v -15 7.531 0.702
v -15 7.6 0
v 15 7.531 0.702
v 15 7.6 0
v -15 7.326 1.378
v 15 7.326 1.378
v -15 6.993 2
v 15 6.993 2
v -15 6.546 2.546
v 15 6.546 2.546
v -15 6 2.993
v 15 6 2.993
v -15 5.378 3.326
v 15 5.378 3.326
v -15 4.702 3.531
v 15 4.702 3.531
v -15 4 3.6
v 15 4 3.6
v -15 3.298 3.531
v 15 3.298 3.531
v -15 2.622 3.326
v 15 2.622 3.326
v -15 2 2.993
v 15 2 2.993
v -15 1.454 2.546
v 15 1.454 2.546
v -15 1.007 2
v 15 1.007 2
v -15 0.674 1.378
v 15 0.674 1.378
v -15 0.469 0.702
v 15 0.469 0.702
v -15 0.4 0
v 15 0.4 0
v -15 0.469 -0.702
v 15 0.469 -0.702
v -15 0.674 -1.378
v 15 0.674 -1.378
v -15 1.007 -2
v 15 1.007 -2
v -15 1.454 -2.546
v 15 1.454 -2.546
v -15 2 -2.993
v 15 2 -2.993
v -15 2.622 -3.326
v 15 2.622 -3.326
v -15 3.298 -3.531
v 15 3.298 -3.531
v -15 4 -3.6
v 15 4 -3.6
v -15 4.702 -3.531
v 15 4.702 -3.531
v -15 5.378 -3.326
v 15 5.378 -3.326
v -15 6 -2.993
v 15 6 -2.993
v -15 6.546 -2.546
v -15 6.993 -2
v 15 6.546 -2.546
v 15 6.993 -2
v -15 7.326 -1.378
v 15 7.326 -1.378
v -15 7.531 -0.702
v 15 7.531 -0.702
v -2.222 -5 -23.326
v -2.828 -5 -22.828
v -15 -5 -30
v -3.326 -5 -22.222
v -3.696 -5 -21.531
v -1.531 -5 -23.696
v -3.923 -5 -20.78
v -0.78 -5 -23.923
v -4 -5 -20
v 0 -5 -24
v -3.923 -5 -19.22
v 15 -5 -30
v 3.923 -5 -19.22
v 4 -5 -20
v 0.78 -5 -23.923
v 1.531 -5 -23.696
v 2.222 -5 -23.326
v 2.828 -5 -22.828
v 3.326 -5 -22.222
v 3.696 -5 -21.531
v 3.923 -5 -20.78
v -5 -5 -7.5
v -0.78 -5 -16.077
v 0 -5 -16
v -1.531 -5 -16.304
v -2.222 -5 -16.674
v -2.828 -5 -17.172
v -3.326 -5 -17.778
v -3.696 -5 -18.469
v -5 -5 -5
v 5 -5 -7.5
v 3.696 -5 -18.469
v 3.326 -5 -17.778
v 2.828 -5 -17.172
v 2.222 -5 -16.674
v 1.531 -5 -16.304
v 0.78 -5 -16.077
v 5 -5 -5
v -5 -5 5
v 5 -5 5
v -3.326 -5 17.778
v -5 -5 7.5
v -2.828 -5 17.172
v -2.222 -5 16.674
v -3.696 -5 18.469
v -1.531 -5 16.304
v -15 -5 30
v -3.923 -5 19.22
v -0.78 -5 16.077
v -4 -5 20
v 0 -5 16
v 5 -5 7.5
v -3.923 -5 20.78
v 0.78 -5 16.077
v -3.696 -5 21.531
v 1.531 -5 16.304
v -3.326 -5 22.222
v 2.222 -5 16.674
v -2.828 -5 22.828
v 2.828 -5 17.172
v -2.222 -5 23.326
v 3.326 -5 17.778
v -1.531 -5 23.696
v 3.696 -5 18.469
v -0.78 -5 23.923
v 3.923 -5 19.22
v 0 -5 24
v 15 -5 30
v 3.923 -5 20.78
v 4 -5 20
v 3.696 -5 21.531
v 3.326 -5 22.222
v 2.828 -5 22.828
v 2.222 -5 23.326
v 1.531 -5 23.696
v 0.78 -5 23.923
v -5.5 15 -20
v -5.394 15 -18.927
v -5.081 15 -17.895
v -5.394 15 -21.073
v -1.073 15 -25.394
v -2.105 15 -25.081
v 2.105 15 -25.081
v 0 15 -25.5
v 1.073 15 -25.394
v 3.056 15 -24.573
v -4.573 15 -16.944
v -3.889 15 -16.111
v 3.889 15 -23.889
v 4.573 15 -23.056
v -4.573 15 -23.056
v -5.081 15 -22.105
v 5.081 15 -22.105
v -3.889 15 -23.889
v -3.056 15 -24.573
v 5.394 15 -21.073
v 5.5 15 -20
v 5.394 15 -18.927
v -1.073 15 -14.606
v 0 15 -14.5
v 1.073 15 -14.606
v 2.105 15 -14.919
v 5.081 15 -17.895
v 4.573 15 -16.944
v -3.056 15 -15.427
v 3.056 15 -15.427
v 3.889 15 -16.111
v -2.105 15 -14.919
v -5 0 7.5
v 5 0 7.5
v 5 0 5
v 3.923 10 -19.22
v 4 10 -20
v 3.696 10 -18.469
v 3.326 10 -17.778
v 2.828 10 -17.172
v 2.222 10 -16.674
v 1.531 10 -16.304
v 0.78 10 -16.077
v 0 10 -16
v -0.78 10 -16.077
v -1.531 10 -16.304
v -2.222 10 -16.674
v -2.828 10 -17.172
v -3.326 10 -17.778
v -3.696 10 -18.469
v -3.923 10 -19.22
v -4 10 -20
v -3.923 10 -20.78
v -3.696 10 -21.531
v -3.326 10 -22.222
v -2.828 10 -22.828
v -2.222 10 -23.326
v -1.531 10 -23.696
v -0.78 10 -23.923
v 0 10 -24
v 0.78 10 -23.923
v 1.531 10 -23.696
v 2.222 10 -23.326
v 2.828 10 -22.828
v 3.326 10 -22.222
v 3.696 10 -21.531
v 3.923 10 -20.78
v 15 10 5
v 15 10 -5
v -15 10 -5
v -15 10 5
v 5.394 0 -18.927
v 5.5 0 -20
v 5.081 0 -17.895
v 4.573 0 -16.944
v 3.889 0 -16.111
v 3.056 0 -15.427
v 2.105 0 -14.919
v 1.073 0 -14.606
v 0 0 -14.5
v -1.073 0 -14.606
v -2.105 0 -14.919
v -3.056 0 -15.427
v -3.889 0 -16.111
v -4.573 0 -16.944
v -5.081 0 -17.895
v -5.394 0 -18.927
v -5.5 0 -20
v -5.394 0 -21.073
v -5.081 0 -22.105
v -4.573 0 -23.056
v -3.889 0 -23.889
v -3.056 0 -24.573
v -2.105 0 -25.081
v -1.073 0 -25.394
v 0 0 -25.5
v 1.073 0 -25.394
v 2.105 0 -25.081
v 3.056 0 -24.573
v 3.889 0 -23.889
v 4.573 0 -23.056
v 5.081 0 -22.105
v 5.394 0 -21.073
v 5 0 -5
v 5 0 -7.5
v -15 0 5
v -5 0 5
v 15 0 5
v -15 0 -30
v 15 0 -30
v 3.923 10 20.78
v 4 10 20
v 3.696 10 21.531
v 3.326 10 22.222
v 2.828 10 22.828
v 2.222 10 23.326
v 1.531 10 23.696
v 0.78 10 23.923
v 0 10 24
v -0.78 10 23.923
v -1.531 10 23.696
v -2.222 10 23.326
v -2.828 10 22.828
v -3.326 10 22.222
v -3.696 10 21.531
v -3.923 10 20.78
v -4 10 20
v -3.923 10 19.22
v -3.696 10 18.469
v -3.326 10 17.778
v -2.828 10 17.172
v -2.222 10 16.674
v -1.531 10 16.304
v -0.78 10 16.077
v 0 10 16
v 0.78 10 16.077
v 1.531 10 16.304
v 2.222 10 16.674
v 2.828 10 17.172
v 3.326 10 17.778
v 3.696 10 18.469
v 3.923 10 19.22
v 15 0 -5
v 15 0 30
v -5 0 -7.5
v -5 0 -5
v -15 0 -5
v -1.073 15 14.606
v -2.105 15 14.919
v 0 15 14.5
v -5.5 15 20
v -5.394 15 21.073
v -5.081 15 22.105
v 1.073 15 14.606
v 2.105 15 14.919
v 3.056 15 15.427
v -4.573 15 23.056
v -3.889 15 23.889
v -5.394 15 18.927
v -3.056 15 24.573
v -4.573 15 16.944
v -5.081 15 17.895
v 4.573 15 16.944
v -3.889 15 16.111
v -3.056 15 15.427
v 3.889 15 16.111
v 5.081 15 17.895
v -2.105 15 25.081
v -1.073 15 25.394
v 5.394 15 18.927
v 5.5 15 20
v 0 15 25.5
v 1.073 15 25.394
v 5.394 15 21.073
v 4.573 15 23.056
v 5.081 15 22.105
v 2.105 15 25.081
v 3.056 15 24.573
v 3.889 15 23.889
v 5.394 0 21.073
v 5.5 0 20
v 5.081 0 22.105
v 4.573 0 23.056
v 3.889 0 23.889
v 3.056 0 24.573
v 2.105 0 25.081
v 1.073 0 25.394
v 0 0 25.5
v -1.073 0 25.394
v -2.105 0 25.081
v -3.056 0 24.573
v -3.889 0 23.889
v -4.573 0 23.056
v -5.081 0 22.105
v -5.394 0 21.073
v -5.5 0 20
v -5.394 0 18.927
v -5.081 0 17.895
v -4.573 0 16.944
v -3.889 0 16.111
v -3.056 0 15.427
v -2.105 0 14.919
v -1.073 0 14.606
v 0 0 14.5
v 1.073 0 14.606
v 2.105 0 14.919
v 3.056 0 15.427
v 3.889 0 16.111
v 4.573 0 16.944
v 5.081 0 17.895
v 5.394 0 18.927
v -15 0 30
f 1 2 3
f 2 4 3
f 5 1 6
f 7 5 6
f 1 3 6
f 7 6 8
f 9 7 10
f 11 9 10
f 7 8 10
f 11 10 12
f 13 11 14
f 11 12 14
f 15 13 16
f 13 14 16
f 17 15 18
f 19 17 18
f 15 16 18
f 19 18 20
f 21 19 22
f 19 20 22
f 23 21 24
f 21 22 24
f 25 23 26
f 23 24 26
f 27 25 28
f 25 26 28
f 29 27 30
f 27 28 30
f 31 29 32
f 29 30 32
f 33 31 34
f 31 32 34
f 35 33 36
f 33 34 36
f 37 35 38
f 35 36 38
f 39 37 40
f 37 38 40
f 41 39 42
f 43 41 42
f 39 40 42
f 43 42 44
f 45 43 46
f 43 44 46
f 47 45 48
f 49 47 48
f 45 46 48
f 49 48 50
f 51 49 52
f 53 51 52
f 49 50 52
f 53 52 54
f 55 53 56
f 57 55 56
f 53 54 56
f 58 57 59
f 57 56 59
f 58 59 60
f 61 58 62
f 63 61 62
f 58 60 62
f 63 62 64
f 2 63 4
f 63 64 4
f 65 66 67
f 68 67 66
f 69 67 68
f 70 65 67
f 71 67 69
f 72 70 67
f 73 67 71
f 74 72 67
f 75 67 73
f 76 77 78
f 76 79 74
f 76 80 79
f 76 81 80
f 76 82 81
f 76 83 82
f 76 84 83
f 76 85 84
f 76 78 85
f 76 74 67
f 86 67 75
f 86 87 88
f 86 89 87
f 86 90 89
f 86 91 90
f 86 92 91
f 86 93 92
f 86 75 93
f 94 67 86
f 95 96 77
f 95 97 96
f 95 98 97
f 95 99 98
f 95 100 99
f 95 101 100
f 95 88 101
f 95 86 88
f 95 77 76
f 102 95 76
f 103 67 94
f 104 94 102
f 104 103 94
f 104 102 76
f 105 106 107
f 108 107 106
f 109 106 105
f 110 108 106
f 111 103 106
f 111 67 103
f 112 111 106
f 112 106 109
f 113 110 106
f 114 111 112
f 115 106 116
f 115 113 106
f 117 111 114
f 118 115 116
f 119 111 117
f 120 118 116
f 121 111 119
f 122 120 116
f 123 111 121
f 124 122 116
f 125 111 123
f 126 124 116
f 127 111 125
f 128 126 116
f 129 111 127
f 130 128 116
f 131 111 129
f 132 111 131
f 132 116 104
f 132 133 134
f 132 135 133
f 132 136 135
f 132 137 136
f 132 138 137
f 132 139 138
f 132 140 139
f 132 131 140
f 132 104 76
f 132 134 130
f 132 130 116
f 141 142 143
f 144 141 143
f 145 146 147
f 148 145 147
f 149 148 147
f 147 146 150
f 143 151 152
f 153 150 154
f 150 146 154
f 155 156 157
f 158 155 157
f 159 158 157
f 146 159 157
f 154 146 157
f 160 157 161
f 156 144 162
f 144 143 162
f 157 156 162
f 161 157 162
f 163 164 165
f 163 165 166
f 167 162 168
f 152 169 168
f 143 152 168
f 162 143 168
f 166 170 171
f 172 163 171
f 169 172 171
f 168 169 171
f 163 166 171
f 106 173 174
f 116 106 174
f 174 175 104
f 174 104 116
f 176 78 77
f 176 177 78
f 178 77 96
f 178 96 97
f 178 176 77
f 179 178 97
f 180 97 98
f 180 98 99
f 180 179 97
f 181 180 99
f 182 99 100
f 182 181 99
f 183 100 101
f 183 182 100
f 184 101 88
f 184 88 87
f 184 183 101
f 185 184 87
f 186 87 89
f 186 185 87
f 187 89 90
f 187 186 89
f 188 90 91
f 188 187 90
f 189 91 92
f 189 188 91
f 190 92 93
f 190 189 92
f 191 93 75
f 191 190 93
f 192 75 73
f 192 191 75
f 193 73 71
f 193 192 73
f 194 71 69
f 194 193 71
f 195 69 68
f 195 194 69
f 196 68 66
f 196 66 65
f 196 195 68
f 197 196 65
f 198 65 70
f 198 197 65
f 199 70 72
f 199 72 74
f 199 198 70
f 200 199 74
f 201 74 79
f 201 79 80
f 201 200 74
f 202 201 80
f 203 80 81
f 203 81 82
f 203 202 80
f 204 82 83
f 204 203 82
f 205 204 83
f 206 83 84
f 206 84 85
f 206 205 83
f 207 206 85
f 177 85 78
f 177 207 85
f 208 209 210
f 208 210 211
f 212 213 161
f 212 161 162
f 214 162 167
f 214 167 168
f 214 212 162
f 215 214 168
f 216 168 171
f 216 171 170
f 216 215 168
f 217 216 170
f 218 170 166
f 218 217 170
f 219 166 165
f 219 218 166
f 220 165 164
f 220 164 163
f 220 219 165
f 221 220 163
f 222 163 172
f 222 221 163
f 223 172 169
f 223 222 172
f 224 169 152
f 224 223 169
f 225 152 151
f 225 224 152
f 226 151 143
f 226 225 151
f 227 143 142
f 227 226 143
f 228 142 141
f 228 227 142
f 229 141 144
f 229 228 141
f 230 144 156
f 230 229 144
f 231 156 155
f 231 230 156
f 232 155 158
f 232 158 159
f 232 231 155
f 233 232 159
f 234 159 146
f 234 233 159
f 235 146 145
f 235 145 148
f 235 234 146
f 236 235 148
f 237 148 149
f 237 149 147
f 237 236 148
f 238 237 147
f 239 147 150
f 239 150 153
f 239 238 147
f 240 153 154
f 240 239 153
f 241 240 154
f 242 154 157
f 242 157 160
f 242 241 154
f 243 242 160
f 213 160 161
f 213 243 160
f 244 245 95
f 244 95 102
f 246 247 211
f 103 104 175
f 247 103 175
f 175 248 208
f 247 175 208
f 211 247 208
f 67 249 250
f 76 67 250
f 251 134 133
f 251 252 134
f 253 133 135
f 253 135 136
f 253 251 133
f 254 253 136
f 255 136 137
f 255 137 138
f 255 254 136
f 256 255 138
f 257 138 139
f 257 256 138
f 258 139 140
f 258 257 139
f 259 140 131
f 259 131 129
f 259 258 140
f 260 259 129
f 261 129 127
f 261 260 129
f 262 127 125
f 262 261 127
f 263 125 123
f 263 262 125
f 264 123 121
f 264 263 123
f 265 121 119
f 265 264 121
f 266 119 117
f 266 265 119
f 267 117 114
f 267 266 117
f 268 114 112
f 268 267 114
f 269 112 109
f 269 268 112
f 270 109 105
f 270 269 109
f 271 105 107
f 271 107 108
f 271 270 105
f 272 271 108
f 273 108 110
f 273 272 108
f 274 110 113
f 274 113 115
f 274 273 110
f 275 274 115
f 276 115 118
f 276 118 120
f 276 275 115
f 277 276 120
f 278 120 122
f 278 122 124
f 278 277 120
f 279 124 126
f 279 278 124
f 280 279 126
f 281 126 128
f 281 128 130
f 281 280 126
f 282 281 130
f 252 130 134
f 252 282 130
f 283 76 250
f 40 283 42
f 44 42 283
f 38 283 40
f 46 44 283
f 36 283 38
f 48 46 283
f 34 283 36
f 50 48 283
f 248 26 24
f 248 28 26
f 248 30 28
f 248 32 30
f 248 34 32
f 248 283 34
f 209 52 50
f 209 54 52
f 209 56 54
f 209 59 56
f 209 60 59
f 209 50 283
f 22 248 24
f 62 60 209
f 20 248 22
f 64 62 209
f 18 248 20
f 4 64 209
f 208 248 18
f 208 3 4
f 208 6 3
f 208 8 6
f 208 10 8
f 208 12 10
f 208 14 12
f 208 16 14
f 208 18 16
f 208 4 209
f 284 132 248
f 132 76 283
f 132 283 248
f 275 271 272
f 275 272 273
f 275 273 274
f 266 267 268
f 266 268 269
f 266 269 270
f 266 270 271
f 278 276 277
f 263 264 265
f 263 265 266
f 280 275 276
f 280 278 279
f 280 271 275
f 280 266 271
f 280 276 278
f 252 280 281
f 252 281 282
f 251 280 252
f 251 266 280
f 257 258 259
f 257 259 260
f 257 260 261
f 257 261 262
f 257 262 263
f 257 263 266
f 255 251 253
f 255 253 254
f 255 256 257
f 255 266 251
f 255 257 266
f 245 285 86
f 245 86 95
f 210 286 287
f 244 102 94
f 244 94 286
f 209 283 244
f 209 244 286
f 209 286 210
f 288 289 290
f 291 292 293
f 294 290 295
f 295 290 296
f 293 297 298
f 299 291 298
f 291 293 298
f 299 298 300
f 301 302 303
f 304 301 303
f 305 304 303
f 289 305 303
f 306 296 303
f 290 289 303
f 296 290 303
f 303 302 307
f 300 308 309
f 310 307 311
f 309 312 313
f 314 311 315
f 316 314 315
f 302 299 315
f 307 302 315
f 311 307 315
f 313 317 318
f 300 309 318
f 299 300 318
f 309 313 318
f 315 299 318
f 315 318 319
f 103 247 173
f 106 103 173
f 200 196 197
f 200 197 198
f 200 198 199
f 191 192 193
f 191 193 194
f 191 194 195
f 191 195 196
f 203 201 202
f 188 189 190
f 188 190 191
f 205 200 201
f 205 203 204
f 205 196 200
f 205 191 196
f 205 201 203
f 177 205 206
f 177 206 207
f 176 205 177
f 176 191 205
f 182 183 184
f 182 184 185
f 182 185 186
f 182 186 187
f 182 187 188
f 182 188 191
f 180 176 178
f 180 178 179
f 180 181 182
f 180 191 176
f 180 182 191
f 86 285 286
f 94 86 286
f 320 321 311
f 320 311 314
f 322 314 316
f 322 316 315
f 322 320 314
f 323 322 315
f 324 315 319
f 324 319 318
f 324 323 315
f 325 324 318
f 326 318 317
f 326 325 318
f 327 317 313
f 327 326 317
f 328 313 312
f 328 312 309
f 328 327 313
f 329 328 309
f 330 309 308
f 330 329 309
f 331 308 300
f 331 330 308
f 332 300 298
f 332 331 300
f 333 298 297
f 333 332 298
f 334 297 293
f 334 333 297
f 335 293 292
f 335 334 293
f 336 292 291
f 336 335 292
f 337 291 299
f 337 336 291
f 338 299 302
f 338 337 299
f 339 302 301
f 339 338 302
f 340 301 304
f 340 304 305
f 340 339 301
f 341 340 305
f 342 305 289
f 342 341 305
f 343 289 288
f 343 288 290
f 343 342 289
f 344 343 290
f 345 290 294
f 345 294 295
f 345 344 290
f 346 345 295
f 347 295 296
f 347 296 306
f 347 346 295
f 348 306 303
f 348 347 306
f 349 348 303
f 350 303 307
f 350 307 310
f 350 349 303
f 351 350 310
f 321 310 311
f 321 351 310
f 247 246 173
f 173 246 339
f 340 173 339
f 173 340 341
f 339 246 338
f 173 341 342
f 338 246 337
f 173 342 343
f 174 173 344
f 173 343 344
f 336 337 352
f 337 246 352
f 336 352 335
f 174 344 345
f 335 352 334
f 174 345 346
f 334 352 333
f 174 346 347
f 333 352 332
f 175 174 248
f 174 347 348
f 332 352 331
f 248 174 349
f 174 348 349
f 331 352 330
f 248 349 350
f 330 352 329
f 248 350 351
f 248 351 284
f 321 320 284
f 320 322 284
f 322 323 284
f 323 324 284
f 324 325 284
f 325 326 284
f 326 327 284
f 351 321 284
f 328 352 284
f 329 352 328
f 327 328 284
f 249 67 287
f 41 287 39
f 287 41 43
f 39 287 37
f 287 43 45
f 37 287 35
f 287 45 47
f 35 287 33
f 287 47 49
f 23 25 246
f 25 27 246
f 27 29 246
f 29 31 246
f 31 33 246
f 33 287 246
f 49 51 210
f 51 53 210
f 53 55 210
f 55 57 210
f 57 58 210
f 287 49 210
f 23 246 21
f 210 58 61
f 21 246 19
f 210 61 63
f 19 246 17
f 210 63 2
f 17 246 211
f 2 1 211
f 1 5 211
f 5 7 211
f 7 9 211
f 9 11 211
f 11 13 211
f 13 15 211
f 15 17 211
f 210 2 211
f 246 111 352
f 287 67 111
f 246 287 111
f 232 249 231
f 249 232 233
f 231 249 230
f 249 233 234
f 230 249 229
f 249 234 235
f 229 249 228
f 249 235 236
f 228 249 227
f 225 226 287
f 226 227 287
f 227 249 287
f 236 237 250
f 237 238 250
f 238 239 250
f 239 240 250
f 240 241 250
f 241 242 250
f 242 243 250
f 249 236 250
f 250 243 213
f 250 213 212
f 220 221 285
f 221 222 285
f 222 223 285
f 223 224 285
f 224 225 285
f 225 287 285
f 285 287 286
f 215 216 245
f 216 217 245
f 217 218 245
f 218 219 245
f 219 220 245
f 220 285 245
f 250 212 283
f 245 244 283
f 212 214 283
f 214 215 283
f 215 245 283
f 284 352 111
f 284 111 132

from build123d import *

# Parameters (mm, degrees)
F0_W     = 30
F0_H     = 60
F0_R     = 5.5
F0_W_2   = 10
F0_H_2   = 2.5
F0_R_2   = 4
F1_DEPTH = 5
F2_DEPTH = 15
F3_W     = 10
F3_H     = 10
F3_R     = 3.6
F4_DEPTH = 15
F5_DEPTH = 25
F6_DEPTH = 10


with BuildPart() as f1:
    # F0 (on Front) → F1 (new body)
    with BuildSketch(Plane.XZ):
        Rectangle(F0_W, F0_H)
        with Locations((0, -20)):
            Circle(F0_R, mode=Mode.SUBTRACT)
        with Locations((0, -6.25)):
            Rectangle(F0_W_2, F0_H_2, mode=Mode.SUBTRACT)
        with Locations((0, 6.25)):
            Rectangle(F0_W_2, F0_H_2, mode=Mode.SUBTRACT)
        with Locations((0, 20)):
            Circle(F0_R, mode=Mode.SUBTRACT)
        with Locations((0, 20)):
            Circle(F0_R)
        with Locations((0, 20)):
            Circle(F0_R_2, mode=Mode.SUBTRACT)
        with Locations((0, -20)):
            Circle(F0_R)
        with Locations((0, -20)):
            Circle(F0_R_2, mode=Mode.SUBTRACT)
    extrude(amount=F1_DEPTH)

    # F0 (on Front) → F2 (join)
    with BuildSketch(Plane.XZ):
        with Locations((0, 20)):
            Circle(F0_R)
        with Locations((0, 20)):
            Circle(F0_R_2, mode=Mode.SUBTRACT)
        with Locations((0, -20)):
            Circle(F0_R)
        with Locations((0, -20)):
            Circle(F0_R_2, mode=Mode.SUBTRACT)
        with Locations((0, 20)):
            Circle(F0_R_2)
        with Locations((0, -20)):
            Circle(F0_R_2)
    extrude(amount=-F2_DEPTH)

    # F3 (on Right) → F4 (join, symmetric)
    with BuildSketch(Plane.YZ):
        with Locations((5, 0)):
            Rectangle(F3_W, F3_H)
        with Locations((4, 0)):
            Circle(F3_R, mode=Mode.SUBTRACT)
        with Locations((4, 0)):
            Circle(F3_R)
    extrude(amount=F4_DEPTH, both=True)

    # F3 (on Right) → F5 (cut, symmetric)
    with BuildSketch(Plane.YZ):
        with Locations((4, 0)):
            Circle(F3_R)
    extrude(amount=F5_DEPTH, both=True, mode=Mode.SUBTRACT)

    # F0 (on Front) → F6 (cut, symmetric)
    with BuildSketch(Plane.XZ):
        with Locations((0, 20)):
            Circle(F0_R_2)
        with Locations((0, -20)):
            Circle(F0_R_2)
    extrude(amount=F6_DEPTH, both=True, mode=Mode.SUBTRACT)


solid = f1.part
